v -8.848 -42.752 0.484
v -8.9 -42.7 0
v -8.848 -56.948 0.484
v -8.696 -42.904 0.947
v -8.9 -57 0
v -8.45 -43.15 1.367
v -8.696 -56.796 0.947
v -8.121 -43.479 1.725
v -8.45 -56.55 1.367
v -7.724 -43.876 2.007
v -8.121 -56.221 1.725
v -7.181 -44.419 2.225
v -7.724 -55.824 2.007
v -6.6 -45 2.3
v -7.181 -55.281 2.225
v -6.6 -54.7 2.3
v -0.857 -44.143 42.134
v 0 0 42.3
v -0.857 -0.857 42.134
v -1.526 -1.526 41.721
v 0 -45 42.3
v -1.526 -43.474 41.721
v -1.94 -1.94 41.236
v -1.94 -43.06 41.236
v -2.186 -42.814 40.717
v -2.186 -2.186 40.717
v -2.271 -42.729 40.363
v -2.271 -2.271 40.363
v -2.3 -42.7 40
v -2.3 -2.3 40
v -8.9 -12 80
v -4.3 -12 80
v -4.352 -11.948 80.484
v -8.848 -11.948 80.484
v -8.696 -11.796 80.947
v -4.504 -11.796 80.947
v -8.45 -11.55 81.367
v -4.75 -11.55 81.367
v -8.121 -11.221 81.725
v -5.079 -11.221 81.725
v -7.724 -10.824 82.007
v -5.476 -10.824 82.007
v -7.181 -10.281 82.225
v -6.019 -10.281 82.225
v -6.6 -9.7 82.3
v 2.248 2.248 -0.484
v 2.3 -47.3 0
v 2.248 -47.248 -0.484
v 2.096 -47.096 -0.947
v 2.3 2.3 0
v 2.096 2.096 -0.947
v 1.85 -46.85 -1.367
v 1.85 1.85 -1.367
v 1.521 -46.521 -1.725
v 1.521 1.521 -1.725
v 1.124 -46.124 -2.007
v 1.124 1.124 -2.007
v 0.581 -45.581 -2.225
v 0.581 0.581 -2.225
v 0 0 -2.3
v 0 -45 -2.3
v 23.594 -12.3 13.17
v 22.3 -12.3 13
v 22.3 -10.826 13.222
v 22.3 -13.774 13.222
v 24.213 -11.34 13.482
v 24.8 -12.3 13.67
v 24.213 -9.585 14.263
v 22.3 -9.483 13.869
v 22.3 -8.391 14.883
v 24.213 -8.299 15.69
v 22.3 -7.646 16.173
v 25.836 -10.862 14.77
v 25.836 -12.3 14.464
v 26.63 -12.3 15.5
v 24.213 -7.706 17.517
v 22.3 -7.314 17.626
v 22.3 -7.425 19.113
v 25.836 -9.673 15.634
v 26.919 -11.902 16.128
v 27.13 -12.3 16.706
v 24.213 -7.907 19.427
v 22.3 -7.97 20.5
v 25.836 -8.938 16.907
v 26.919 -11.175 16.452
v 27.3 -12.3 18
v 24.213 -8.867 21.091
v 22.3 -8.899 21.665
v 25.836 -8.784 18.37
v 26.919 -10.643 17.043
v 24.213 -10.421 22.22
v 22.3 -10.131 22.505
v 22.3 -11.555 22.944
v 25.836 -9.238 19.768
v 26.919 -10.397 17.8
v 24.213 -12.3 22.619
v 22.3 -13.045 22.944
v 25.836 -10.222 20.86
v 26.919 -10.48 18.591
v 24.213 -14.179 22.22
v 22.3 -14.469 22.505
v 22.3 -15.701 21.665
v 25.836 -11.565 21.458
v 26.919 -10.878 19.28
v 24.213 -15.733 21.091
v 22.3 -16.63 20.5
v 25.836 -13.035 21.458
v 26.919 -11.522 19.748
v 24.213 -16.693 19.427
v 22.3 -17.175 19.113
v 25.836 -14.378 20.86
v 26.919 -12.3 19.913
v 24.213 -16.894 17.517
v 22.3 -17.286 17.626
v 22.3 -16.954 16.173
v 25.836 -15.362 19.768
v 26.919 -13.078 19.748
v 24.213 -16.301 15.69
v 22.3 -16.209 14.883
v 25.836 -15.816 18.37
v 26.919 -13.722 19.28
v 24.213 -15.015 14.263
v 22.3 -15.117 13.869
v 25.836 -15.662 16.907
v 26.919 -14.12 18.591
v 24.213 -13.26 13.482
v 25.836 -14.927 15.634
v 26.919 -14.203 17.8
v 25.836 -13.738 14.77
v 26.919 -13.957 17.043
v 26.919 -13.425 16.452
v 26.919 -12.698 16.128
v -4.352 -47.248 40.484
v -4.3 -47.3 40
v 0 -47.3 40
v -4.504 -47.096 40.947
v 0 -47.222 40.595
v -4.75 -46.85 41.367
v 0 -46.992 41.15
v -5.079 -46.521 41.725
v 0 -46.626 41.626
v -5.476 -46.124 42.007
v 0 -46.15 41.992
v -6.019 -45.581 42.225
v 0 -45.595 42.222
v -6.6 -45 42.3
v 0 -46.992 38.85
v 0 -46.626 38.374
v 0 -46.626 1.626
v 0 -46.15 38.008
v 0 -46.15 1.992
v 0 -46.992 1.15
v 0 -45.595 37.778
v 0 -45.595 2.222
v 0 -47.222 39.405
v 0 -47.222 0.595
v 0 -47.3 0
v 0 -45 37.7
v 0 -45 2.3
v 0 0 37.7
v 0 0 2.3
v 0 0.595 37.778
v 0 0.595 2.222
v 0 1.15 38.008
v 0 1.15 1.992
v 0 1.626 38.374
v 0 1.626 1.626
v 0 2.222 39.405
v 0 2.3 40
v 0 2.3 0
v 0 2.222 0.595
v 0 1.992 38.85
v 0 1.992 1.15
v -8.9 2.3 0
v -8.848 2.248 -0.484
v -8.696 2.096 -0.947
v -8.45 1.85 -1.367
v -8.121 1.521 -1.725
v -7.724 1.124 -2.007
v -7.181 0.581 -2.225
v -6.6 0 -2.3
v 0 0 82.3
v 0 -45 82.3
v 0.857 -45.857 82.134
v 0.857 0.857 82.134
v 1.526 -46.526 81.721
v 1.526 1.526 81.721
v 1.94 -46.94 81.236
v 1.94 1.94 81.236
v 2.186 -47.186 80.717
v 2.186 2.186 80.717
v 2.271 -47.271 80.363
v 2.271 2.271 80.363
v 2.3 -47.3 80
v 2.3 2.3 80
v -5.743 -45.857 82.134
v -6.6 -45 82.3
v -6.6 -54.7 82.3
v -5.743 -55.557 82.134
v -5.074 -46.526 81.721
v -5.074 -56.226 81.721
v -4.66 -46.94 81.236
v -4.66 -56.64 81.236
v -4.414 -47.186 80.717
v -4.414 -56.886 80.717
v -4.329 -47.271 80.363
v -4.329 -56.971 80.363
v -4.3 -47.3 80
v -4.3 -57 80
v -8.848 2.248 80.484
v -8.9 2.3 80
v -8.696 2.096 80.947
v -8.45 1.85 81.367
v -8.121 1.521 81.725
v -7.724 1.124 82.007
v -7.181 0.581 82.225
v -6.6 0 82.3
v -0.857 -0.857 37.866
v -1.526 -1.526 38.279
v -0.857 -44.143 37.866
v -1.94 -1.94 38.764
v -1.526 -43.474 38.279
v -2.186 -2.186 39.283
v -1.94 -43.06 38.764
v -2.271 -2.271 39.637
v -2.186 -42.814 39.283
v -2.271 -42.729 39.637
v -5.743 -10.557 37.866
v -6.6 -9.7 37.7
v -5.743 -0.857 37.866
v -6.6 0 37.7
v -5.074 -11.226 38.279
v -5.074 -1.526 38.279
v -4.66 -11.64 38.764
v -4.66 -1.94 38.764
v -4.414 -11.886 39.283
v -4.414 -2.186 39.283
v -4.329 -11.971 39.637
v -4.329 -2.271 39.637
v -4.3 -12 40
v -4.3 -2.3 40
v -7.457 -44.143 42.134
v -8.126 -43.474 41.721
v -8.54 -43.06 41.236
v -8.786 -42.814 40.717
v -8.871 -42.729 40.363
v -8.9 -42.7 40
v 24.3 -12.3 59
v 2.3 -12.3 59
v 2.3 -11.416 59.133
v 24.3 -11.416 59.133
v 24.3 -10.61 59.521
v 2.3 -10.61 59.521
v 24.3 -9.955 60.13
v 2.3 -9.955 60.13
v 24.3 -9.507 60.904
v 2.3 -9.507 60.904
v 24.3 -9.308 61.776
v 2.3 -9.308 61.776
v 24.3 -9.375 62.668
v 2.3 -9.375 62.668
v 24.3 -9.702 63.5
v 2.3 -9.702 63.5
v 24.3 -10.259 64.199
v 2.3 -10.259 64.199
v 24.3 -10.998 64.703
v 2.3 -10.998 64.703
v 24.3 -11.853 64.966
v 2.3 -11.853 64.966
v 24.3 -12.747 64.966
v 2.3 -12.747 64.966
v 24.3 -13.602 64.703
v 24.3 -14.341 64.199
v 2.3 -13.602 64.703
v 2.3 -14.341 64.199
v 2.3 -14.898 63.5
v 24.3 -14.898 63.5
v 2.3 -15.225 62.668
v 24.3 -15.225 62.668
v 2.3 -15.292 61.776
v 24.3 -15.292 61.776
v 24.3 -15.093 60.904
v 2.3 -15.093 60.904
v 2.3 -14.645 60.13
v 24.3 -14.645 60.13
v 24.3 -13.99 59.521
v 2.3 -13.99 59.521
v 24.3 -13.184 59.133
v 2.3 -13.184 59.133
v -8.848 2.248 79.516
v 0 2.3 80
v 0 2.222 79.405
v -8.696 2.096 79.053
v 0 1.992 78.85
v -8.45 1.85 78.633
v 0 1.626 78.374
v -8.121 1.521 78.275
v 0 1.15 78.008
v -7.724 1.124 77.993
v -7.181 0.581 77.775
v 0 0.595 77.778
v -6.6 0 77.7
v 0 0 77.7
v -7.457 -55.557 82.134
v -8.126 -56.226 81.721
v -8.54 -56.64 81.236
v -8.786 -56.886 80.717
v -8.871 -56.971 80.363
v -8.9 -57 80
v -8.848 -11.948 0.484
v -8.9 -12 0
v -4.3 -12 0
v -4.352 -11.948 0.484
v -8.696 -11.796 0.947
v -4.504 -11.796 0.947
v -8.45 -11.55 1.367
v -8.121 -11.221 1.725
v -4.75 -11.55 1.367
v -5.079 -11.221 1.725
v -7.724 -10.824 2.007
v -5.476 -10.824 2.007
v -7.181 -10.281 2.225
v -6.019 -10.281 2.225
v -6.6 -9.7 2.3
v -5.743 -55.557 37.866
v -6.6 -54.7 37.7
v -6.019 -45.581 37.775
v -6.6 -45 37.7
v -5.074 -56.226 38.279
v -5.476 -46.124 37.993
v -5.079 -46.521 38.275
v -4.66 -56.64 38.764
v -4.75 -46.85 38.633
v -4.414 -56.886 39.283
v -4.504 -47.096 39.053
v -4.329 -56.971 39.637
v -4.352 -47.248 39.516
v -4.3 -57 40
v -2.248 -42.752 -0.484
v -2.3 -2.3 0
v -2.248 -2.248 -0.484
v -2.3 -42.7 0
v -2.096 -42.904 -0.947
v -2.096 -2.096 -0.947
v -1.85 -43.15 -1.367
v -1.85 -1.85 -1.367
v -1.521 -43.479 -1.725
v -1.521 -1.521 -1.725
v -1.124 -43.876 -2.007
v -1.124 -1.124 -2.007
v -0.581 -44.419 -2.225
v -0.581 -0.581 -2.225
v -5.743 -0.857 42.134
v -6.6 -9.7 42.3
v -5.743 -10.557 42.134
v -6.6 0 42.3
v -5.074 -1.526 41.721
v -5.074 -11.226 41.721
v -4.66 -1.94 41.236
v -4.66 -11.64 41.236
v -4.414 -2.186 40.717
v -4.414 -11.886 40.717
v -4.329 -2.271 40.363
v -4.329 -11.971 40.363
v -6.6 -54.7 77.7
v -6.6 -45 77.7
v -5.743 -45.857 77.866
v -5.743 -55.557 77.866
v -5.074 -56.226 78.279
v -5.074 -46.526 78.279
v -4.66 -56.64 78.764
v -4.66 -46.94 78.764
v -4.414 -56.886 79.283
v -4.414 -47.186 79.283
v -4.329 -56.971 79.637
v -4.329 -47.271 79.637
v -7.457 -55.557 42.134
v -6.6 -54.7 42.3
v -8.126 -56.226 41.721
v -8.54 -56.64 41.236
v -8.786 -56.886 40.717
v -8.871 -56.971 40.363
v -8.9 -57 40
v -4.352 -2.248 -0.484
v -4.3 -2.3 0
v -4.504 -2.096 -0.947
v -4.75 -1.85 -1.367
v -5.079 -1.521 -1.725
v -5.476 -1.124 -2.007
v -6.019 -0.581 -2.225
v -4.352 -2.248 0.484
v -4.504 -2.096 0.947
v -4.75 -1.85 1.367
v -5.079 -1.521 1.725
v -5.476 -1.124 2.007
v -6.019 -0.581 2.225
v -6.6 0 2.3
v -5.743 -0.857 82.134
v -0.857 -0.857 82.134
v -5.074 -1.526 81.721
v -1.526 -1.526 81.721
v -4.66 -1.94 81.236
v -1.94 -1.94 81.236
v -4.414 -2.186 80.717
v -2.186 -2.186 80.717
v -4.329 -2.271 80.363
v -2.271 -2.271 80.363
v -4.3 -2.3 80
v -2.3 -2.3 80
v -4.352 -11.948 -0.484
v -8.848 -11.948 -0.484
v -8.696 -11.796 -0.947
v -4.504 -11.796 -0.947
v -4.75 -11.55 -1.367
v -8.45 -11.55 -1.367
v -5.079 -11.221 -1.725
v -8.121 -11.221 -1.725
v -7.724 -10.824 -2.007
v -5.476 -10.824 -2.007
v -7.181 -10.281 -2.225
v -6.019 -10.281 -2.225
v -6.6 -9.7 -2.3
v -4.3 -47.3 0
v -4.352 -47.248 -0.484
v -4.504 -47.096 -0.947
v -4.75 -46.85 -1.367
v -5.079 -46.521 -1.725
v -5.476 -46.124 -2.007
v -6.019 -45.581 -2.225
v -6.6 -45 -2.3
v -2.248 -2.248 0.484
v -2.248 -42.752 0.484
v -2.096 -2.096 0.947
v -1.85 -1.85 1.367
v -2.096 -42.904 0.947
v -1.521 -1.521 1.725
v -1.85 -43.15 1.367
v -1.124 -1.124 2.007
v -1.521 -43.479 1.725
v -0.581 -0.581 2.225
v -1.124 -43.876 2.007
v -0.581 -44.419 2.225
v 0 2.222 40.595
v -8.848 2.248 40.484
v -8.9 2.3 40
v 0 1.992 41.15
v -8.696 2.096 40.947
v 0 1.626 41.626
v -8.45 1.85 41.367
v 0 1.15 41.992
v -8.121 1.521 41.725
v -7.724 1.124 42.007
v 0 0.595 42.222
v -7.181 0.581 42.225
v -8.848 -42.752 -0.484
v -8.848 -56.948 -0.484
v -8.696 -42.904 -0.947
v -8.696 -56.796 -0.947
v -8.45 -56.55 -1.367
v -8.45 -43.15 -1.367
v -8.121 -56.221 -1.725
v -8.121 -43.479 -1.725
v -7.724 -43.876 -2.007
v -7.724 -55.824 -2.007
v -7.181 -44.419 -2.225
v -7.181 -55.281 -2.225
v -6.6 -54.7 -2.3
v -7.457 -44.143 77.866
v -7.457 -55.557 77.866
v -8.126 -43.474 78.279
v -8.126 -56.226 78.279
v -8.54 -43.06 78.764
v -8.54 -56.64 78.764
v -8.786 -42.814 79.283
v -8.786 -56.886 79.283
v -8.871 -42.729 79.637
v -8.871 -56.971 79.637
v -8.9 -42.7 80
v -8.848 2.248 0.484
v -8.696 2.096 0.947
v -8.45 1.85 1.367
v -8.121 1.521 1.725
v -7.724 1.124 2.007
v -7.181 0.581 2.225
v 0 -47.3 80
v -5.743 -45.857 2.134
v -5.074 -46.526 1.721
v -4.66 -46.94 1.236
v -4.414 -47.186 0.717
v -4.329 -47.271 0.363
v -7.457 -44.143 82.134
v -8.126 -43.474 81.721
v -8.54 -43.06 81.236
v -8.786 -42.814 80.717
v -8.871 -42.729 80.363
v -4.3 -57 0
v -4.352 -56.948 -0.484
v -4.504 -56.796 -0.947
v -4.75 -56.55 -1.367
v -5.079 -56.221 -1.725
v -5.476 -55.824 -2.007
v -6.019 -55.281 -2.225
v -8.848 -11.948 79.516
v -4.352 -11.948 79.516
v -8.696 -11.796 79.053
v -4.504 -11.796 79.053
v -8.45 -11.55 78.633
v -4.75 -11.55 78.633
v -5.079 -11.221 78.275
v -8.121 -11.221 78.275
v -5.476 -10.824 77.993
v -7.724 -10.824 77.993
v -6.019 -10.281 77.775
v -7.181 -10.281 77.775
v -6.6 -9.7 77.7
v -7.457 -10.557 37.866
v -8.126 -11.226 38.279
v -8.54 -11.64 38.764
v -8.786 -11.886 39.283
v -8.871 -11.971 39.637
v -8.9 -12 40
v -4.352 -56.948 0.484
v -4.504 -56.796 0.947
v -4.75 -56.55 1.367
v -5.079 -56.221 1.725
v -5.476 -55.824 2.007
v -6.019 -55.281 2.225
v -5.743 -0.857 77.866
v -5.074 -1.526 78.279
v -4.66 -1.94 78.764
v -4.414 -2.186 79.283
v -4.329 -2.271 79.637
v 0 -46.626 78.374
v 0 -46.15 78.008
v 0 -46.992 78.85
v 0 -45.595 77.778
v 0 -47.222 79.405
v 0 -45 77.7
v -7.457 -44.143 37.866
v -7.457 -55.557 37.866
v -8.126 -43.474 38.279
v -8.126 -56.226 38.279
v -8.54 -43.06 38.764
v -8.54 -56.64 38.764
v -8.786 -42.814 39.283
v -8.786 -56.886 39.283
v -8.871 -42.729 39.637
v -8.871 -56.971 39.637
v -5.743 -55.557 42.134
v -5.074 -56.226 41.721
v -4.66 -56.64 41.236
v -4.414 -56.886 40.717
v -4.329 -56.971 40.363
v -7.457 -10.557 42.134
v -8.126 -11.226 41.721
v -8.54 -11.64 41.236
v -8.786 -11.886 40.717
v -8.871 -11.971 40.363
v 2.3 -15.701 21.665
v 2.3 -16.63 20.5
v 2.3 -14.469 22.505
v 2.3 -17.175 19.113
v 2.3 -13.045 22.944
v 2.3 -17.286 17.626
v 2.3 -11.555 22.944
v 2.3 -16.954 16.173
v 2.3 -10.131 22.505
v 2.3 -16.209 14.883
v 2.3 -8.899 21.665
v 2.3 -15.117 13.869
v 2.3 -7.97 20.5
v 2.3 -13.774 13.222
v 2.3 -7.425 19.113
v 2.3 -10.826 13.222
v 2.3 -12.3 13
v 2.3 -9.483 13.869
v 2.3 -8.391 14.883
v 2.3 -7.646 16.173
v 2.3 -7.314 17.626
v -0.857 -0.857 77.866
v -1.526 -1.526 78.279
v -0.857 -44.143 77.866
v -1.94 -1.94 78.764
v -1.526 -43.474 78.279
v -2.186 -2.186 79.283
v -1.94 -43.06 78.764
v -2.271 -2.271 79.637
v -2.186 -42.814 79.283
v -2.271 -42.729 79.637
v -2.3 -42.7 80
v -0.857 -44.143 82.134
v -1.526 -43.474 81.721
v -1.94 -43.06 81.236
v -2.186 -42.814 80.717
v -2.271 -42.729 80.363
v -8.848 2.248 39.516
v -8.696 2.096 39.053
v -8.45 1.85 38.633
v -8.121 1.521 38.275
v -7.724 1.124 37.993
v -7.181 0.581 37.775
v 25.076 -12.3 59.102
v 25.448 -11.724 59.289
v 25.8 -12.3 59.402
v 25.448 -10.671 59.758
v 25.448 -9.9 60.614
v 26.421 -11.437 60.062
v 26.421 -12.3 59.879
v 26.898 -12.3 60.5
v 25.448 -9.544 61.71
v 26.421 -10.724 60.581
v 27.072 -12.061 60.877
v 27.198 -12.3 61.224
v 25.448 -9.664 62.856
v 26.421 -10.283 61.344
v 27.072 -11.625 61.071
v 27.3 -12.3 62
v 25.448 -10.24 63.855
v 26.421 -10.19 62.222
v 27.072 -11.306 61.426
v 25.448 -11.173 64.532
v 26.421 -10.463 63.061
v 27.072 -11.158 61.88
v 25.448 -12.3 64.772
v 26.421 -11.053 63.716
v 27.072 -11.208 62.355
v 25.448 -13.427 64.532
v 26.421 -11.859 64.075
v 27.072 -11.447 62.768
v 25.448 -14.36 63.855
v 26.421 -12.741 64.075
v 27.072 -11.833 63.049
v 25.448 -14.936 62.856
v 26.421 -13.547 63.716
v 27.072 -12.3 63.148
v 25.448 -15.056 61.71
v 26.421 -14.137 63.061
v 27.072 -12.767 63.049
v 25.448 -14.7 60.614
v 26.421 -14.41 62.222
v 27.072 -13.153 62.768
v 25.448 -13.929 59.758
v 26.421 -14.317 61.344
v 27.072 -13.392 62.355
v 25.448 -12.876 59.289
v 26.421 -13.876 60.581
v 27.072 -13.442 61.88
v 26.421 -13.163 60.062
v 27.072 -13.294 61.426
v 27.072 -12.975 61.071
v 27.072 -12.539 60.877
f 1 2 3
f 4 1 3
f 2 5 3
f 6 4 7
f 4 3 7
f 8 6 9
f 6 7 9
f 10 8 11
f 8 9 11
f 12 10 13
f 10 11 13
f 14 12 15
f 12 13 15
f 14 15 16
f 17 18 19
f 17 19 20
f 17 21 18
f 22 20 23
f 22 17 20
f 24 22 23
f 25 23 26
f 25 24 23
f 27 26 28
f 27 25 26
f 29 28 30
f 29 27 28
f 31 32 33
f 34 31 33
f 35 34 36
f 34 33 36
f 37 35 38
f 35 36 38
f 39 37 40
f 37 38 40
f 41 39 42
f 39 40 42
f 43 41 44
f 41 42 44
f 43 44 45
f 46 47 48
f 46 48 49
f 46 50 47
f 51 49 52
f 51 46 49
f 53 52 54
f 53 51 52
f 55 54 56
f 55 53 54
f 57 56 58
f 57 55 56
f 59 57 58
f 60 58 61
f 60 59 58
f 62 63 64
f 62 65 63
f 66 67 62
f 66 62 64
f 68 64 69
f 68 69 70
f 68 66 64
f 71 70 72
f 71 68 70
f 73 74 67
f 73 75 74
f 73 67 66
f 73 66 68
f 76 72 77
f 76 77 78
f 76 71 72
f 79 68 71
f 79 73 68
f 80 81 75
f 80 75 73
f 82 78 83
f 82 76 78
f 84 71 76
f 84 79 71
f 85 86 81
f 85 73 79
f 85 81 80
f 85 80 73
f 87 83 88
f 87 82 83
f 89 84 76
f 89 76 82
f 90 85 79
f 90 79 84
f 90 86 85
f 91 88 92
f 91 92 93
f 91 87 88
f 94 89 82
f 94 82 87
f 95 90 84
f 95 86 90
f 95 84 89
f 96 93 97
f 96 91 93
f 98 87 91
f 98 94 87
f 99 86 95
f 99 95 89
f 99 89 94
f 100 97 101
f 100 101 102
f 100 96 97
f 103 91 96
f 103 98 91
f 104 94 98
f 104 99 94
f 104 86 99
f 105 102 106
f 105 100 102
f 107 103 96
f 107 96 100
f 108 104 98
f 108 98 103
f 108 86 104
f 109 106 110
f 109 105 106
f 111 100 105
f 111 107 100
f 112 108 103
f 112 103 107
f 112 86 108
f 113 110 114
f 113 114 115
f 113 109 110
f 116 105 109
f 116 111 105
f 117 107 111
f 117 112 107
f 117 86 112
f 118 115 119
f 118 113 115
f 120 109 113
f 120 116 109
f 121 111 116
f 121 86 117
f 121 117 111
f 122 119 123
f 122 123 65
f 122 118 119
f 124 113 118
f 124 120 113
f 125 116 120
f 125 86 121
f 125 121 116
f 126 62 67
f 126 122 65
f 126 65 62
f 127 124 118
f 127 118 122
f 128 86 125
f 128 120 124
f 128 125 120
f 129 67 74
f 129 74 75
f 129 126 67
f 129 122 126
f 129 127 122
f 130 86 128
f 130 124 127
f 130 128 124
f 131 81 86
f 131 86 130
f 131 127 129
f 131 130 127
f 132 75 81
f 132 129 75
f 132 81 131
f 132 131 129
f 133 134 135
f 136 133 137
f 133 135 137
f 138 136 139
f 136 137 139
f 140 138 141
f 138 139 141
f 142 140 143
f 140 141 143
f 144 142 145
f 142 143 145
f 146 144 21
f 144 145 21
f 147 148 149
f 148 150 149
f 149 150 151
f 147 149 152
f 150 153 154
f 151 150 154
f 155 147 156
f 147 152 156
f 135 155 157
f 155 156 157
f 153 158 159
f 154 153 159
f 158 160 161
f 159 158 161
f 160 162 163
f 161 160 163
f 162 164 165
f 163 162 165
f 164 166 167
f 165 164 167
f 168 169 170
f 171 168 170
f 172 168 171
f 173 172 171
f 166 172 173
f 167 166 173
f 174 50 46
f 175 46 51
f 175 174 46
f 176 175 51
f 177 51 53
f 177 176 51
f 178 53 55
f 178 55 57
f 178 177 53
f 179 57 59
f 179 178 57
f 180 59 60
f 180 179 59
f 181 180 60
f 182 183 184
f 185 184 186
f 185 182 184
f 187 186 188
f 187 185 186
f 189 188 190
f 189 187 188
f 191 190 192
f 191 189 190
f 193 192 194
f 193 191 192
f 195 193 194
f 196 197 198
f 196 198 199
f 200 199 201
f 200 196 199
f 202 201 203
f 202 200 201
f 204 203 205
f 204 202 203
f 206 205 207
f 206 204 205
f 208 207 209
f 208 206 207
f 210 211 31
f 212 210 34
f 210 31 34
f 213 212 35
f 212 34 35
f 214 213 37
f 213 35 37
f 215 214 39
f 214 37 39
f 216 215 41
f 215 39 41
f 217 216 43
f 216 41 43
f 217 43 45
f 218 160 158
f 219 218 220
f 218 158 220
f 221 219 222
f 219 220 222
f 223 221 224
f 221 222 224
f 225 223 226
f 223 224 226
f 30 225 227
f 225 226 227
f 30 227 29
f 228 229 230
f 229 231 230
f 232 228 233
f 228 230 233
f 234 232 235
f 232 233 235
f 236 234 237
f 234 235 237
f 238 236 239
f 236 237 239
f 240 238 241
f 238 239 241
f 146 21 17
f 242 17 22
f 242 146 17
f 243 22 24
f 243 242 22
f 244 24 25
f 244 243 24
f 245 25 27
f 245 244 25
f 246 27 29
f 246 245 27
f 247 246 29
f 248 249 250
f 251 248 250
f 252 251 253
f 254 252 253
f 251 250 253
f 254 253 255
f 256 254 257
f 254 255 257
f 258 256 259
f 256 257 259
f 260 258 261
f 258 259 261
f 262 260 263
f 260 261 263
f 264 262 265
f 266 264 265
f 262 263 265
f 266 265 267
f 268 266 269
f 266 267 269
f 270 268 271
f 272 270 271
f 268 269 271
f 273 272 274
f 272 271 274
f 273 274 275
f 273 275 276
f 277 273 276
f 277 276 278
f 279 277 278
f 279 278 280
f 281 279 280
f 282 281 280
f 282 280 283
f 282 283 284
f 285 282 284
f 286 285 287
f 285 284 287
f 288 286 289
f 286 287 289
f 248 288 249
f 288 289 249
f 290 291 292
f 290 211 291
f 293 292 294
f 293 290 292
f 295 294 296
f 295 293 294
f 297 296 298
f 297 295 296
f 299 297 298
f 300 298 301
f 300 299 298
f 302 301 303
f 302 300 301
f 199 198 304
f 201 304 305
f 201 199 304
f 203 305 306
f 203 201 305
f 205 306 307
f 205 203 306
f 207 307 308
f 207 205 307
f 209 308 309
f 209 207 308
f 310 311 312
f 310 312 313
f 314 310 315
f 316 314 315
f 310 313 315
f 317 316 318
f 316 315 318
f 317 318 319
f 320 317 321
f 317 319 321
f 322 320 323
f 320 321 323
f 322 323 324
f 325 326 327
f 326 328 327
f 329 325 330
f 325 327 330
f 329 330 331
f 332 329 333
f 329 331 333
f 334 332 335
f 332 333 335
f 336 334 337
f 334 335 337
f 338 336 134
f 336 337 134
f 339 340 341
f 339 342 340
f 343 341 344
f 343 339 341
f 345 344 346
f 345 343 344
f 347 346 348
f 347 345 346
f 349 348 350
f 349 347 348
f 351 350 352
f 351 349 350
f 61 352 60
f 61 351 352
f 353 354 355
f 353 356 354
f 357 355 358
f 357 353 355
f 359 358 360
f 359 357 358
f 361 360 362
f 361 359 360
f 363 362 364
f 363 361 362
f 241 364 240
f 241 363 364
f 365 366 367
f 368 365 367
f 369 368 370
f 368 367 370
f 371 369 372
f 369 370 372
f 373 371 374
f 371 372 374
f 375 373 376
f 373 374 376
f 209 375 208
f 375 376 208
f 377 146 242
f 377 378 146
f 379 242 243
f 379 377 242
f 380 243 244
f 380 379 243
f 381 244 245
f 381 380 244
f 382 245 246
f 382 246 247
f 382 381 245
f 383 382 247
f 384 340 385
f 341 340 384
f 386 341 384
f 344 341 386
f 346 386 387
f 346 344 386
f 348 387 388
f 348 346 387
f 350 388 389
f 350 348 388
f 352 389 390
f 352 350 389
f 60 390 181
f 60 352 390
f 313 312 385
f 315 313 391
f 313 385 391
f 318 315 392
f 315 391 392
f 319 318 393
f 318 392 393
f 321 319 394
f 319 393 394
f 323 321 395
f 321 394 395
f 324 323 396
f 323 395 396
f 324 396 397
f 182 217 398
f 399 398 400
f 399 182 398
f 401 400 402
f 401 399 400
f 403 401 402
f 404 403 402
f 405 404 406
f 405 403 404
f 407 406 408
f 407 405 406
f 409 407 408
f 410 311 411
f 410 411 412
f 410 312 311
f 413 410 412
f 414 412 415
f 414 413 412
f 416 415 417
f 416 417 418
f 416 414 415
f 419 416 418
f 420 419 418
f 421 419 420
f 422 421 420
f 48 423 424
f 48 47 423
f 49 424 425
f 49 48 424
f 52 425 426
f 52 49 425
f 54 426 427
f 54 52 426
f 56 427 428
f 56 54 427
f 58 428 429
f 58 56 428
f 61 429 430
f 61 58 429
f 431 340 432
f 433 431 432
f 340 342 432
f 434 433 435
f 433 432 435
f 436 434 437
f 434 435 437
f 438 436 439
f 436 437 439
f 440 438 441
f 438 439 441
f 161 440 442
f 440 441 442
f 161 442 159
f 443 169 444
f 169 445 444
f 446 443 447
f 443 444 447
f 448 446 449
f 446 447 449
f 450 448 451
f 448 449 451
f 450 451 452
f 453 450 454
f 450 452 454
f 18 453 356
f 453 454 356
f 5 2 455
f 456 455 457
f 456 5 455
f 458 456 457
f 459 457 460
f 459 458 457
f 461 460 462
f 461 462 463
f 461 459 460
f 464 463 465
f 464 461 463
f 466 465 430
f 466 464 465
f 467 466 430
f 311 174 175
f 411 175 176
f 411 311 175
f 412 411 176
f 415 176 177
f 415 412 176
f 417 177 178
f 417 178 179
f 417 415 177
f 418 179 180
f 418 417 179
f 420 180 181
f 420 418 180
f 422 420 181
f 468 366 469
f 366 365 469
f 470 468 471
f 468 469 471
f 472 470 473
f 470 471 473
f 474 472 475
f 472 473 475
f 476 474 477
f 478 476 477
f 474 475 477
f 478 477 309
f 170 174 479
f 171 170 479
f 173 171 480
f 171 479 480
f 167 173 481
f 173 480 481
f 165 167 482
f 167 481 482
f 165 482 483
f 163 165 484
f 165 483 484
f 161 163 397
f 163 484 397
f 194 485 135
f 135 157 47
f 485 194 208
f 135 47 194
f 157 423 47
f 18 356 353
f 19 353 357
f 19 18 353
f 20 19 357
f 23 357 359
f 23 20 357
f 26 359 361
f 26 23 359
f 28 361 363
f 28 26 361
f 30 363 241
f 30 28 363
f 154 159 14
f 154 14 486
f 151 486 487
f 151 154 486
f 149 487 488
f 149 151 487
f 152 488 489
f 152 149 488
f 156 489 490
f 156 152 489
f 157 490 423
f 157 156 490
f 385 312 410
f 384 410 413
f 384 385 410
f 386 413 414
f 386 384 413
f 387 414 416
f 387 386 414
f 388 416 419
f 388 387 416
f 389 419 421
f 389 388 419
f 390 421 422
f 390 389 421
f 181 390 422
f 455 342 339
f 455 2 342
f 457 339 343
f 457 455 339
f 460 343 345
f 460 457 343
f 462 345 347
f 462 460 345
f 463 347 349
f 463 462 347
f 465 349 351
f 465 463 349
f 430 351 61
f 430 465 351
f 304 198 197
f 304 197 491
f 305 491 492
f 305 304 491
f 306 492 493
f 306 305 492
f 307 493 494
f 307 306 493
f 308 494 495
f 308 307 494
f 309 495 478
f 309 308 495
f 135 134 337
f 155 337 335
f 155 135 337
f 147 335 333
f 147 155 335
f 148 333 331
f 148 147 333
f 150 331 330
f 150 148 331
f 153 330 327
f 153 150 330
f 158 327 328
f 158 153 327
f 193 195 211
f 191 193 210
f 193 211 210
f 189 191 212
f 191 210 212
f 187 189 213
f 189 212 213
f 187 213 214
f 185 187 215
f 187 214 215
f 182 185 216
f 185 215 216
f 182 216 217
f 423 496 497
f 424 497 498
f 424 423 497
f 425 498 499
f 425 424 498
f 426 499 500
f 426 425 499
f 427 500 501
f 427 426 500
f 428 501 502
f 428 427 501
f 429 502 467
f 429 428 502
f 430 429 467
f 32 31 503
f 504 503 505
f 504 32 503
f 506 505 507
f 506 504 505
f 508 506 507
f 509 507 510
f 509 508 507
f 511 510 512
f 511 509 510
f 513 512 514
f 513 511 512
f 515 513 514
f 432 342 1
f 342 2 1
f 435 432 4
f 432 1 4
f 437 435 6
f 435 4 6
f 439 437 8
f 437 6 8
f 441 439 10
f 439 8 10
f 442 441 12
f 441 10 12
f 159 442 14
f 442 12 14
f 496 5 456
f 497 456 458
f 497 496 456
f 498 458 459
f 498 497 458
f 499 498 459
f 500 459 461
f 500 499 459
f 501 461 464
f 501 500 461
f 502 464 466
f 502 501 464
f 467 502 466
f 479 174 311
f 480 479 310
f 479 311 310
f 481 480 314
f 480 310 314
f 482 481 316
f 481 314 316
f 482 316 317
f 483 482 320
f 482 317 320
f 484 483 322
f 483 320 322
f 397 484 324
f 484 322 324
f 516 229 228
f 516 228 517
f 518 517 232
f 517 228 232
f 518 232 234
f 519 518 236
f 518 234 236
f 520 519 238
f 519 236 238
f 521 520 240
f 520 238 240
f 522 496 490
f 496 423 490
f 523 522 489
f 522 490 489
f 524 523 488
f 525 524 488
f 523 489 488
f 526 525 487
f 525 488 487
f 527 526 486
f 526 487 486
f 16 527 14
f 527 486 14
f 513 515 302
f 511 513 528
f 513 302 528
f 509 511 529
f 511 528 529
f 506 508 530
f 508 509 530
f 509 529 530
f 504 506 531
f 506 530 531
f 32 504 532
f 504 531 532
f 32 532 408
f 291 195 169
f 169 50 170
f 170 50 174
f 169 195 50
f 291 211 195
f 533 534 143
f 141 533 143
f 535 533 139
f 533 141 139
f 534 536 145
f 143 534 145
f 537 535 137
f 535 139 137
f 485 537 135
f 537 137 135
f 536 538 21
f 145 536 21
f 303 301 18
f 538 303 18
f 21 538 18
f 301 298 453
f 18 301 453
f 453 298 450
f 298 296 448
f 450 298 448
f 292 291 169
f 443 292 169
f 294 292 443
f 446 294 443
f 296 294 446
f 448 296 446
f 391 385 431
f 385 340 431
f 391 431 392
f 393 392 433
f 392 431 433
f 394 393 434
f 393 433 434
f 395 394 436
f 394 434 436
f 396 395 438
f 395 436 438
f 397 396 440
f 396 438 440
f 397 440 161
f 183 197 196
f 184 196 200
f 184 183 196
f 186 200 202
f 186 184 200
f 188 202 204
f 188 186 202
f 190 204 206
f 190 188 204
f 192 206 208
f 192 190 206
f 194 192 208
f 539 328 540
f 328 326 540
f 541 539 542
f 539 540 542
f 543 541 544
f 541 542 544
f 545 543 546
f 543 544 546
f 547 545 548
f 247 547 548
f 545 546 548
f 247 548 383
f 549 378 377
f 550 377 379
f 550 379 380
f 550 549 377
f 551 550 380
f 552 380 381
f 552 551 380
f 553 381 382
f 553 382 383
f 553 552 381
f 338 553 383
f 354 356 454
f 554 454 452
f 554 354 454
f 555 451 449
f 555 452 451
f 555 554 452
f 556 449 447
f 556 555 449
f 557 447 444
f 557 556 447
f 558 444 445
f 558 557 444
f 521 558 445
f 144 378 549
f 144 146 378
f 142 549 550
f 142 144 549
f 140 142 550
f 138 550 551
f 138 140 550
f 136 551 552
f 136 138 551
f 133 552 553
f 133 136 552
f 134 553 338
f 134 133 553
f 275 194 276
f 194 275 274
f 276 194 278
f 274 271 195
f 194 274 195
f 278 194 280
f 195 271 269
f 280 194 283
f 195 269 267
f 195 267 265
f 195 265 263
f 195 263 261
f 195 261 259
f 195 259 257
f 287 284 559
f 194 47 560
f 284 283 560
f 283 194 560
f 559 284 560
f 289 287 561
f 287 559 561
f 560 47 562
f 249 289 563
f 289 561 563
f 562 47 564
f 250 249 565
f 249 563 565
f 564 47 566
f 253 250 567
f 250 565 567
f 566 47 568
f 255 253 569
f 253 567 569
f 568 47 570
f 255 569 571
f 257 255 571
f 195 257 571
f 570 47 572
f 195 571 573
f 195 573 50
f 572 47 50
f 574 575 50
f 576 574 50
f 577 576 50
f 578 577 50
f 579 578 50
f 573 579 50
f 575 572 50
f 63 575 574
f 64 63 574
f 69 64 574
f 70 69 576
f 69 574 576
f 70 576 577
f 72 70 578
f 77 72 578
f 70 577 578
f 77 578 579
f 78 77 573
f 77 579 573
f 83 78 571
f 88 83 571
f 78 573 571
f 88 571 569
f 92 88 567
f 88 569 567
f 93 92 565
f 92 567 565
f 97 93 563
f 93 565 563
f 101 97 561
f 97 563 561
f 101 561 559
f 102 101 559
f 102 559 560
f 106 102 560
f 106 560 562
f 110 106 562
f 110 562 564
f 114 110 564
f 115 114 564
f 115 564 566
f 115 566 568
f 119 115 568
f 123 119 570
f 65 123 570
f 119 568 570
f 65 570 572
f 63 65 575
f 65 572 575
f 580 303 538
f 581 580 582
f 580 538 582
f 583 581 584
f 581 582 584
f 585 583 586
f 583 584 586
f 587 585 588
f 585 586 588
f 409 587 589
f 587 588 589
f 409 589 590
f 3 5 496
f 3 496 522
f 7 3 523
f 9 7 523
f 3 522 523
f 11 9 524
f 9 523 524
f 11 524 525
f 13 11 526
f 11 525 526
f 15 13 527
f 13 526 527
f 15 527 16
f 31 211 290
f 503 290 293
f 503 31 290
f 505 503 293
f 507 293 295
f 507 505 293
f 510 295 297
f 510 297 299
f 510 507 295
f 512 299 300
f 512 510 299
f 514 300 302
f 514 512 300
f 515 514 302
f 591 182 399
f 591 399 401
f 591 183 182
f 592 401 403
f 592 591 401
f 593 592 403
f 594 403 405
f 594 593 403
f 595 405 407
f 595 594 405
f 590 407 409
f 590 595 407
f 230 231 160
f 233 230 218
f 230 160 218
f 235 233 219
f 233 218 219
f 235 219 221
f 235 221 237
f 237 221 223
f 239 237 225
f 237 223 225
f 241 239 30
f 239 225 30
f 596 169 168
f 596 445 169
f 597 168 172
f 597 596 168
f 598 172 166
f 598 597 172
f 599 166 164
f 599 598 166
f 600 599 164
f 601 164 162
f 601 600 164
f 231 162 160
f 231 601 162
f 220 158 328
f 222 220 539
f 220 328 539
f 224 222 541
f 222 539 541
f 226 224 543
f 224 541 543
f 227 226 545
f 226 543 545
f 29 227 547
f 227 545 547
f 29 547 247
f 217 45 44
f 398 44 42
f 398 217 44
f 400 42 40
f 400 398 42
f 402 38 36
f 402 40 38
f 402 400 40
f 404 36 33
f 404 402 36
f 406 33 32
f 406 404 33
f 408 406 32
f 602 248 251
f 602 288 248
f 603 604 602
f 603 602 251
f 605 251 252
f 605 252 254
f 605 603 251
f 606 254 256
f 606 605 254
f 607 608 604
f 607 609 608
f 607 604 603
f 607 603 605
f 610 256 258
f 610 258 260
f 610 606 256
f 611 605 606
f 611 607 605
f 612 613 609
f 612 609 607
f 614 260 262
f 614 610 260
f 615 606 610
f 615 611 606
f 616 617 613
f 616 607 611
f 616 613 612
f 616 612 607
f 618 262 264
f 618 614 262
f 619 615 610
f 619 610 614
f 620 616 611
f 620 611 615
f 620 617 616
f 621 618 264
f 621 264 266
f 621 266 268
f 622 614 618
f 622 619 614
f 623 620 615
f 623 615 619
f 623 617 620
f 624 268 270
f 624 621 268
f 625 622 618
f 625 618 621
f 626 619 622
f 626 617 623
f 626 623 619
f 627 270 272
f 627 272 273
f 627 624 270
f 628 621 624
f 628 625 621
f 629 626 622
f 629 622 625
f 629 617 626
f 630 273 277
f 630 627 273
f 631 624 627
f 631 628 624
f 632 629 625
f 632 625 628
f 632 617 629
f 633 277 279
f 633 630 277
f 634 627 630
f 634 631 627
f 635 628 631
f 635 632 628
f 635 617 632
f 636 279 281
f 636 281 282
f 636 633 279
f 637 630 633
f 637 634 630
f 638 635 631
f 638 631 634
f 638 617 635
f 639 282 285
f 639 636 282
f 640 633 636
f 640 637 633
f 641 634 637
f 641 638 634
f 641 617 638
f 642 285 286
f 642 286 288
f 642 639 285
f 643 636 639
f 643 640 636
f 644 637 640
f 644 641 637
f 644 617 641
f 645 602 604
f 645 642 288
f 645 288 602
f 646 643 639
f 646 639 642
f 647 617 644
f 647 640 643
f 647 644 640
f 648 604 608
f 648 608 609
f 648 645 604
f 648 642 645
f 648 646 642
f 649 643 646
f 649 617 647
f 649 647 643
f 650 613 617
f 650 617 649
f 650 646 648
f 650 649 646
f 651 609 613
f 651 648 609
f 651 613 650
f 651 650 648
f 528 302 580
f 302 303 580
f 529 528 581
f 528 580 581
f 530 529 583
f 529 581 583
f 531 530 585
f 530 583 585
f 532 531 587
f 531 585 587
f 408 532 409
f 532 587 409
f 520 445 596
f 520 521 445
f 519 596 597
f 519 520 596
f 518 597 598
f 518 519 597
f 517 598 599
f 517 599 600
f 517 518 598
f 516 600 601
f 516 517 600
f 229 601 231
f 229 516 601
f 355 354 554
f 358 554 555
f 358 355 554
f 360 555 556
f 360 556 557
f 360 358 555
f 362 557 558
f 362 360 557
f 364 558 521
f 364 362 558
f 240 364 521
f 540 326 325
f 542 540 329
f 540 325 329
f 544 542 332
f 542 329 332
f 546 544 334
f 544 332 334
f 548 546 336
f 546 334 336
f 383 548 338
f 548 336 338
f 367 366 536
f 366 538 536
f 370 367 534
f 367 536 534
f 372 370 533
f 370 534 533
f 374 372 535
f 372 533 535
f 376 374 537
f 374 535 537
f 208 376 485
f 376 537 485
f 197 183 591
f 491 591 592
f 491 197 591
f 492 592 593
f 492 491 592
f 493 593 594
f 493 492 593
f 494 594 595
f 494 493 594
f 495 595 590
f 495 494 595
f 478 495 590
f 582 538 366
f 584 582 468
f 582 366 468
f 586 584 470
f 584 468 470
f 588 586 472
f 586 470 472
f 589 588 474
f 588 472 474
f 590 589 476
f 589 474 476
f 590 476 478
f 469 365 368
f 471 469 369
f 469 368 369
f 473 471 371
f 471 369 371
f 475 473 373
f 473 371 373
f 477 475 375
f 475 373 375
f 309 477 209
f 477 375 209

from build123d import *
from OCP.BRepFilletAPI import BRepFilletAPI_MakeFillet

# Parameters (mm, degrees)
EXTRU_MINCE1_DEPTH           = 2.3
CONG_1_R                     = 2.3
ESQUISSE2_W                  = 80
ESQUISSE2_H                  = 49.6
BOSS_EXTRU_1_DEPTH           = 2.3
R_P_TITION_START             = 77.7
R_P_TITION_LIN_AIRE1_DEPTH   = 4.6
R_P_TITION_START_2           = 37.7
R_P_TITION_LIN_AIRE1_2_DEPTH = 4.6
CONG_2_R                     = 2.3
ESQUISSE3_R                  = 3
ESQUISSE3_R_2                = 5
BOSS_EXTRU_2_DEPTH           = 25
CONG_5_R1                    = 3
CONG_5_R2                    = 5


# Read off the part's stored shape, not the designer's step: Répétition linéaire1
with BuildPart() as part:
    # Esquisse1 → Extru.-Mince1 (new, symmetric)
    with BuildSketch(Plane.XY):
        Polygon((-4.3, -57), (-4.3, -47.3), (2.3, -47.3), (2.3, 2.3), (-8.9, 2.3), (-8.9, -12), (-4.3, -12), (-4.3, -2.3), (-2.3, -2.3), (-2.3, -42.7), (-8.9, -42.7), (-8.9, -57), align=None)
    extrude(amount=EXTRU_MINCE1_DEPTH, both=True)

    # Congé1
    cong_1_edges = [part.edges().sort_by_distance(p)[0] for p in [
        (-6.6, -57, -2.3),
        (-4.3, -52.15, -2.3),
        (-1, -47.3, -2.3),
        (2.3, -22.5, -2.3),
        (-3.3, 2.3, -2.3),
        (-8.9, -4.85, -2.3),
        (-6.6, -12, -2.3),
        (-4.3, -7.15, -2.3),
        (-3.3, -2.3, -2.3),
        (-2.3, -22.5, -2.3),
        (-5.6, -42.7, -2.3),
        (-8.9, -49.85, -2.3),
        (-5.6, -42.7, 2.3),
        (-2.3, -22.5, 2.3),
        (-3.3, -2.3, 2.3),
        (-4.3, -7.15, 2.3),
        (-6.6, -12, 2.3),
        (-8.9, -4.85, 2.3),
        (-3.3, 2.3, 2.3),
        (2.3, -22.5, 2.3),
        (-1, -47.3, 2.3),
        (-4.3, -52.15, 2.3),
        (-6.6, -57, 2.3),
        (-8.9, -49.85, 2.3),
    ]]
    fillet(cong_1_edges, radius=CONG_1_R - 0.0001)  # a hair under: the kernel refuses the full size

    # Esquisse2 → Boss.-Extru.1 (add)
    with BuildSketch(Plane(origin=(0, 0, 0), x_dir=(0, 0, -1), z_dir=(1, 0, 0))):
        with Locations((-40, -22.5)):
            Rectangle(ESQUISSE2_W, ESQUISSE2_H)
    extrude(amount=BOSS_EXTRU_1_DEPTH)

    # Répétition linéaire1 outline → Répétition linéaire1 (add)
    with BuildSketch(Plane.XY.offset(R_P_TITION_START)):
        Polygon((-8.9, 2.3), (-8.9, -12), (-4.3, -12), (-4.3, -2.3), (-2.3, -2.3), (-2.3, -42.7), (-8.9, -42.7), (-8.9, -57), (-4.3, -57), (-4.3, -47.3), (2.3, -47.3), (2.3, 2.3), align=None)
    extrude(amount=R_P_TITION_LIN_AIRE1_DEPTH)

    # R_p_tition lin_aire1 2 outline → R_p_tition lin_aire1 2 (add)
    with BuildSketch(Plane.XY.offset(R_P_TITION_START_2)):
        Polygon((0, 2.3), (-8.9, 2.3), (-8.9, -12), (-4.3, -12), (-4.3, -2.3), (-2.3, -2.3), (-2.3, -42.7), (-8.9, -42.7), (-8.9, -57), (-4.3, -57), (-4.3, -47.3), (0, -47.3), align=None)
    extrude(amount=R_P_TITION_LIN_AIRE1_2_DEPTH)

    # Congé2
    cong_2_edges = [part.edges().sort_by_distance(p)[0] for p in [
        (2.3, -22.5, 82.3),
        (-1, -47.3, 82.3),
        (-3.3, 2.3, 82.3),
        (-4.45, 2.3, 77.7),
        (-2.15, -47.3, 77.7),
        (-4.3, -52.15, 77.7),
        (-6.6, -57, 77.7),
        (-6.6, -12, 77.7),
        (-8.9, -4.85, 77.7),
        (-8.9, -49.85, 77.7),
        (-6.6, -57, 82.3),
        (-4.3, -52.15, 82.3),
        (-8.9, -4.85, 82.3),
        (-6.6, -12, 82.3),
        (-4.3, -7.15, 77.7),
        (-3.3, -2.3, 77.7),
        (-2.3, -22.5, 77.7),
        (-5.6, -42.7, 77.7),
        (-8.9, -49.85, 82.3),
        (-4.3, -7.15, 82.3),
        (-3.3, -2.3, 82.3),
        (-2.3, -22.5, 82.3),
        (-5.6, -42.7, 82.3),
        (-2.15, -47.3, 42.3),
        (-4.45, 2.3, 42.3),
        (-4.3, -7.15, 42.3),
        (-3.3, -2.3, 42.3),
        (-2.3, -22.5, 42.3),
        (-5.6, -42.7, 42.3),
        (-8.9, -49.85, 42.3),
        (-4.45, 2.3, 37.7),
        (-2.15, -47.3, 37.7),
        (-4.3, -52.15, 37.7),
        (-6.6, -57, 37.7),
        (-6.6, -12, 37.7),
        (-8.9, -4.85, 37.7),
        (-8.9, -49.85, 37.7),
        (-6.6, -57, 42.3),
        (-4.3, -52.15, 42.3),
        (-8.9, -4.85, 42.3),
        (-6.6, -12, 42.3),
        (-4.3, -7.15, 37.7),
        (-3.3, -2.3, 37.7),
        (-2.3, -22.5, 37.7),
        (-5.6, -42.7, 37.7),
    ]]
    fillet(cong_2_edges, radius=CONG_2_R - 0.0001)  # a hair under: the kernel refuses the full size

    # Esquisse3 → Boss.-Extru.2 (add)
    with BuildSketch(Plane(origin=(2.3, 0, 0), x_dir=(0, 0, -1), z_dir=(1, 0, 0))):
        with Locations((-62, -12.3)):
            Circle(ESQUISSE3_R)
        with Locations((-18, -12.3)):
            Circle(ESQUISSE3_R_2)
    extrude(amount=BOSS_EXTRU_2_DEPTH)

    # Congé5: one fillet with a radius per group of edges: ONE call of the kernel's fillet builder (fillet() takes one radius for all edges)
    cong_5_edges_1 = [part.edges().sort_by_distance(p)[0] for p in [
        (27.3, -12.3, 65),
    ]]
    cong_5_edges_2 = [part.edges().sort_by_distance(p)[0] for p in [
        (27.3, -12.3, 23),
    ]]
    cong_5 = BRepFilletAPI_MakeFillet(part.part.solid().wrapped)
    for e in cong_5_edges_1:
        cong_5.Add(CONG_5_R1, e.wrapped)
    for e in cong_5_edges_2:
        cong_5.Add(CONG_5_R2, e.wrapped)
    add(Compound.cast(cong_5.Shape()), mode=Mode.REPLACE)


solid = part.part
